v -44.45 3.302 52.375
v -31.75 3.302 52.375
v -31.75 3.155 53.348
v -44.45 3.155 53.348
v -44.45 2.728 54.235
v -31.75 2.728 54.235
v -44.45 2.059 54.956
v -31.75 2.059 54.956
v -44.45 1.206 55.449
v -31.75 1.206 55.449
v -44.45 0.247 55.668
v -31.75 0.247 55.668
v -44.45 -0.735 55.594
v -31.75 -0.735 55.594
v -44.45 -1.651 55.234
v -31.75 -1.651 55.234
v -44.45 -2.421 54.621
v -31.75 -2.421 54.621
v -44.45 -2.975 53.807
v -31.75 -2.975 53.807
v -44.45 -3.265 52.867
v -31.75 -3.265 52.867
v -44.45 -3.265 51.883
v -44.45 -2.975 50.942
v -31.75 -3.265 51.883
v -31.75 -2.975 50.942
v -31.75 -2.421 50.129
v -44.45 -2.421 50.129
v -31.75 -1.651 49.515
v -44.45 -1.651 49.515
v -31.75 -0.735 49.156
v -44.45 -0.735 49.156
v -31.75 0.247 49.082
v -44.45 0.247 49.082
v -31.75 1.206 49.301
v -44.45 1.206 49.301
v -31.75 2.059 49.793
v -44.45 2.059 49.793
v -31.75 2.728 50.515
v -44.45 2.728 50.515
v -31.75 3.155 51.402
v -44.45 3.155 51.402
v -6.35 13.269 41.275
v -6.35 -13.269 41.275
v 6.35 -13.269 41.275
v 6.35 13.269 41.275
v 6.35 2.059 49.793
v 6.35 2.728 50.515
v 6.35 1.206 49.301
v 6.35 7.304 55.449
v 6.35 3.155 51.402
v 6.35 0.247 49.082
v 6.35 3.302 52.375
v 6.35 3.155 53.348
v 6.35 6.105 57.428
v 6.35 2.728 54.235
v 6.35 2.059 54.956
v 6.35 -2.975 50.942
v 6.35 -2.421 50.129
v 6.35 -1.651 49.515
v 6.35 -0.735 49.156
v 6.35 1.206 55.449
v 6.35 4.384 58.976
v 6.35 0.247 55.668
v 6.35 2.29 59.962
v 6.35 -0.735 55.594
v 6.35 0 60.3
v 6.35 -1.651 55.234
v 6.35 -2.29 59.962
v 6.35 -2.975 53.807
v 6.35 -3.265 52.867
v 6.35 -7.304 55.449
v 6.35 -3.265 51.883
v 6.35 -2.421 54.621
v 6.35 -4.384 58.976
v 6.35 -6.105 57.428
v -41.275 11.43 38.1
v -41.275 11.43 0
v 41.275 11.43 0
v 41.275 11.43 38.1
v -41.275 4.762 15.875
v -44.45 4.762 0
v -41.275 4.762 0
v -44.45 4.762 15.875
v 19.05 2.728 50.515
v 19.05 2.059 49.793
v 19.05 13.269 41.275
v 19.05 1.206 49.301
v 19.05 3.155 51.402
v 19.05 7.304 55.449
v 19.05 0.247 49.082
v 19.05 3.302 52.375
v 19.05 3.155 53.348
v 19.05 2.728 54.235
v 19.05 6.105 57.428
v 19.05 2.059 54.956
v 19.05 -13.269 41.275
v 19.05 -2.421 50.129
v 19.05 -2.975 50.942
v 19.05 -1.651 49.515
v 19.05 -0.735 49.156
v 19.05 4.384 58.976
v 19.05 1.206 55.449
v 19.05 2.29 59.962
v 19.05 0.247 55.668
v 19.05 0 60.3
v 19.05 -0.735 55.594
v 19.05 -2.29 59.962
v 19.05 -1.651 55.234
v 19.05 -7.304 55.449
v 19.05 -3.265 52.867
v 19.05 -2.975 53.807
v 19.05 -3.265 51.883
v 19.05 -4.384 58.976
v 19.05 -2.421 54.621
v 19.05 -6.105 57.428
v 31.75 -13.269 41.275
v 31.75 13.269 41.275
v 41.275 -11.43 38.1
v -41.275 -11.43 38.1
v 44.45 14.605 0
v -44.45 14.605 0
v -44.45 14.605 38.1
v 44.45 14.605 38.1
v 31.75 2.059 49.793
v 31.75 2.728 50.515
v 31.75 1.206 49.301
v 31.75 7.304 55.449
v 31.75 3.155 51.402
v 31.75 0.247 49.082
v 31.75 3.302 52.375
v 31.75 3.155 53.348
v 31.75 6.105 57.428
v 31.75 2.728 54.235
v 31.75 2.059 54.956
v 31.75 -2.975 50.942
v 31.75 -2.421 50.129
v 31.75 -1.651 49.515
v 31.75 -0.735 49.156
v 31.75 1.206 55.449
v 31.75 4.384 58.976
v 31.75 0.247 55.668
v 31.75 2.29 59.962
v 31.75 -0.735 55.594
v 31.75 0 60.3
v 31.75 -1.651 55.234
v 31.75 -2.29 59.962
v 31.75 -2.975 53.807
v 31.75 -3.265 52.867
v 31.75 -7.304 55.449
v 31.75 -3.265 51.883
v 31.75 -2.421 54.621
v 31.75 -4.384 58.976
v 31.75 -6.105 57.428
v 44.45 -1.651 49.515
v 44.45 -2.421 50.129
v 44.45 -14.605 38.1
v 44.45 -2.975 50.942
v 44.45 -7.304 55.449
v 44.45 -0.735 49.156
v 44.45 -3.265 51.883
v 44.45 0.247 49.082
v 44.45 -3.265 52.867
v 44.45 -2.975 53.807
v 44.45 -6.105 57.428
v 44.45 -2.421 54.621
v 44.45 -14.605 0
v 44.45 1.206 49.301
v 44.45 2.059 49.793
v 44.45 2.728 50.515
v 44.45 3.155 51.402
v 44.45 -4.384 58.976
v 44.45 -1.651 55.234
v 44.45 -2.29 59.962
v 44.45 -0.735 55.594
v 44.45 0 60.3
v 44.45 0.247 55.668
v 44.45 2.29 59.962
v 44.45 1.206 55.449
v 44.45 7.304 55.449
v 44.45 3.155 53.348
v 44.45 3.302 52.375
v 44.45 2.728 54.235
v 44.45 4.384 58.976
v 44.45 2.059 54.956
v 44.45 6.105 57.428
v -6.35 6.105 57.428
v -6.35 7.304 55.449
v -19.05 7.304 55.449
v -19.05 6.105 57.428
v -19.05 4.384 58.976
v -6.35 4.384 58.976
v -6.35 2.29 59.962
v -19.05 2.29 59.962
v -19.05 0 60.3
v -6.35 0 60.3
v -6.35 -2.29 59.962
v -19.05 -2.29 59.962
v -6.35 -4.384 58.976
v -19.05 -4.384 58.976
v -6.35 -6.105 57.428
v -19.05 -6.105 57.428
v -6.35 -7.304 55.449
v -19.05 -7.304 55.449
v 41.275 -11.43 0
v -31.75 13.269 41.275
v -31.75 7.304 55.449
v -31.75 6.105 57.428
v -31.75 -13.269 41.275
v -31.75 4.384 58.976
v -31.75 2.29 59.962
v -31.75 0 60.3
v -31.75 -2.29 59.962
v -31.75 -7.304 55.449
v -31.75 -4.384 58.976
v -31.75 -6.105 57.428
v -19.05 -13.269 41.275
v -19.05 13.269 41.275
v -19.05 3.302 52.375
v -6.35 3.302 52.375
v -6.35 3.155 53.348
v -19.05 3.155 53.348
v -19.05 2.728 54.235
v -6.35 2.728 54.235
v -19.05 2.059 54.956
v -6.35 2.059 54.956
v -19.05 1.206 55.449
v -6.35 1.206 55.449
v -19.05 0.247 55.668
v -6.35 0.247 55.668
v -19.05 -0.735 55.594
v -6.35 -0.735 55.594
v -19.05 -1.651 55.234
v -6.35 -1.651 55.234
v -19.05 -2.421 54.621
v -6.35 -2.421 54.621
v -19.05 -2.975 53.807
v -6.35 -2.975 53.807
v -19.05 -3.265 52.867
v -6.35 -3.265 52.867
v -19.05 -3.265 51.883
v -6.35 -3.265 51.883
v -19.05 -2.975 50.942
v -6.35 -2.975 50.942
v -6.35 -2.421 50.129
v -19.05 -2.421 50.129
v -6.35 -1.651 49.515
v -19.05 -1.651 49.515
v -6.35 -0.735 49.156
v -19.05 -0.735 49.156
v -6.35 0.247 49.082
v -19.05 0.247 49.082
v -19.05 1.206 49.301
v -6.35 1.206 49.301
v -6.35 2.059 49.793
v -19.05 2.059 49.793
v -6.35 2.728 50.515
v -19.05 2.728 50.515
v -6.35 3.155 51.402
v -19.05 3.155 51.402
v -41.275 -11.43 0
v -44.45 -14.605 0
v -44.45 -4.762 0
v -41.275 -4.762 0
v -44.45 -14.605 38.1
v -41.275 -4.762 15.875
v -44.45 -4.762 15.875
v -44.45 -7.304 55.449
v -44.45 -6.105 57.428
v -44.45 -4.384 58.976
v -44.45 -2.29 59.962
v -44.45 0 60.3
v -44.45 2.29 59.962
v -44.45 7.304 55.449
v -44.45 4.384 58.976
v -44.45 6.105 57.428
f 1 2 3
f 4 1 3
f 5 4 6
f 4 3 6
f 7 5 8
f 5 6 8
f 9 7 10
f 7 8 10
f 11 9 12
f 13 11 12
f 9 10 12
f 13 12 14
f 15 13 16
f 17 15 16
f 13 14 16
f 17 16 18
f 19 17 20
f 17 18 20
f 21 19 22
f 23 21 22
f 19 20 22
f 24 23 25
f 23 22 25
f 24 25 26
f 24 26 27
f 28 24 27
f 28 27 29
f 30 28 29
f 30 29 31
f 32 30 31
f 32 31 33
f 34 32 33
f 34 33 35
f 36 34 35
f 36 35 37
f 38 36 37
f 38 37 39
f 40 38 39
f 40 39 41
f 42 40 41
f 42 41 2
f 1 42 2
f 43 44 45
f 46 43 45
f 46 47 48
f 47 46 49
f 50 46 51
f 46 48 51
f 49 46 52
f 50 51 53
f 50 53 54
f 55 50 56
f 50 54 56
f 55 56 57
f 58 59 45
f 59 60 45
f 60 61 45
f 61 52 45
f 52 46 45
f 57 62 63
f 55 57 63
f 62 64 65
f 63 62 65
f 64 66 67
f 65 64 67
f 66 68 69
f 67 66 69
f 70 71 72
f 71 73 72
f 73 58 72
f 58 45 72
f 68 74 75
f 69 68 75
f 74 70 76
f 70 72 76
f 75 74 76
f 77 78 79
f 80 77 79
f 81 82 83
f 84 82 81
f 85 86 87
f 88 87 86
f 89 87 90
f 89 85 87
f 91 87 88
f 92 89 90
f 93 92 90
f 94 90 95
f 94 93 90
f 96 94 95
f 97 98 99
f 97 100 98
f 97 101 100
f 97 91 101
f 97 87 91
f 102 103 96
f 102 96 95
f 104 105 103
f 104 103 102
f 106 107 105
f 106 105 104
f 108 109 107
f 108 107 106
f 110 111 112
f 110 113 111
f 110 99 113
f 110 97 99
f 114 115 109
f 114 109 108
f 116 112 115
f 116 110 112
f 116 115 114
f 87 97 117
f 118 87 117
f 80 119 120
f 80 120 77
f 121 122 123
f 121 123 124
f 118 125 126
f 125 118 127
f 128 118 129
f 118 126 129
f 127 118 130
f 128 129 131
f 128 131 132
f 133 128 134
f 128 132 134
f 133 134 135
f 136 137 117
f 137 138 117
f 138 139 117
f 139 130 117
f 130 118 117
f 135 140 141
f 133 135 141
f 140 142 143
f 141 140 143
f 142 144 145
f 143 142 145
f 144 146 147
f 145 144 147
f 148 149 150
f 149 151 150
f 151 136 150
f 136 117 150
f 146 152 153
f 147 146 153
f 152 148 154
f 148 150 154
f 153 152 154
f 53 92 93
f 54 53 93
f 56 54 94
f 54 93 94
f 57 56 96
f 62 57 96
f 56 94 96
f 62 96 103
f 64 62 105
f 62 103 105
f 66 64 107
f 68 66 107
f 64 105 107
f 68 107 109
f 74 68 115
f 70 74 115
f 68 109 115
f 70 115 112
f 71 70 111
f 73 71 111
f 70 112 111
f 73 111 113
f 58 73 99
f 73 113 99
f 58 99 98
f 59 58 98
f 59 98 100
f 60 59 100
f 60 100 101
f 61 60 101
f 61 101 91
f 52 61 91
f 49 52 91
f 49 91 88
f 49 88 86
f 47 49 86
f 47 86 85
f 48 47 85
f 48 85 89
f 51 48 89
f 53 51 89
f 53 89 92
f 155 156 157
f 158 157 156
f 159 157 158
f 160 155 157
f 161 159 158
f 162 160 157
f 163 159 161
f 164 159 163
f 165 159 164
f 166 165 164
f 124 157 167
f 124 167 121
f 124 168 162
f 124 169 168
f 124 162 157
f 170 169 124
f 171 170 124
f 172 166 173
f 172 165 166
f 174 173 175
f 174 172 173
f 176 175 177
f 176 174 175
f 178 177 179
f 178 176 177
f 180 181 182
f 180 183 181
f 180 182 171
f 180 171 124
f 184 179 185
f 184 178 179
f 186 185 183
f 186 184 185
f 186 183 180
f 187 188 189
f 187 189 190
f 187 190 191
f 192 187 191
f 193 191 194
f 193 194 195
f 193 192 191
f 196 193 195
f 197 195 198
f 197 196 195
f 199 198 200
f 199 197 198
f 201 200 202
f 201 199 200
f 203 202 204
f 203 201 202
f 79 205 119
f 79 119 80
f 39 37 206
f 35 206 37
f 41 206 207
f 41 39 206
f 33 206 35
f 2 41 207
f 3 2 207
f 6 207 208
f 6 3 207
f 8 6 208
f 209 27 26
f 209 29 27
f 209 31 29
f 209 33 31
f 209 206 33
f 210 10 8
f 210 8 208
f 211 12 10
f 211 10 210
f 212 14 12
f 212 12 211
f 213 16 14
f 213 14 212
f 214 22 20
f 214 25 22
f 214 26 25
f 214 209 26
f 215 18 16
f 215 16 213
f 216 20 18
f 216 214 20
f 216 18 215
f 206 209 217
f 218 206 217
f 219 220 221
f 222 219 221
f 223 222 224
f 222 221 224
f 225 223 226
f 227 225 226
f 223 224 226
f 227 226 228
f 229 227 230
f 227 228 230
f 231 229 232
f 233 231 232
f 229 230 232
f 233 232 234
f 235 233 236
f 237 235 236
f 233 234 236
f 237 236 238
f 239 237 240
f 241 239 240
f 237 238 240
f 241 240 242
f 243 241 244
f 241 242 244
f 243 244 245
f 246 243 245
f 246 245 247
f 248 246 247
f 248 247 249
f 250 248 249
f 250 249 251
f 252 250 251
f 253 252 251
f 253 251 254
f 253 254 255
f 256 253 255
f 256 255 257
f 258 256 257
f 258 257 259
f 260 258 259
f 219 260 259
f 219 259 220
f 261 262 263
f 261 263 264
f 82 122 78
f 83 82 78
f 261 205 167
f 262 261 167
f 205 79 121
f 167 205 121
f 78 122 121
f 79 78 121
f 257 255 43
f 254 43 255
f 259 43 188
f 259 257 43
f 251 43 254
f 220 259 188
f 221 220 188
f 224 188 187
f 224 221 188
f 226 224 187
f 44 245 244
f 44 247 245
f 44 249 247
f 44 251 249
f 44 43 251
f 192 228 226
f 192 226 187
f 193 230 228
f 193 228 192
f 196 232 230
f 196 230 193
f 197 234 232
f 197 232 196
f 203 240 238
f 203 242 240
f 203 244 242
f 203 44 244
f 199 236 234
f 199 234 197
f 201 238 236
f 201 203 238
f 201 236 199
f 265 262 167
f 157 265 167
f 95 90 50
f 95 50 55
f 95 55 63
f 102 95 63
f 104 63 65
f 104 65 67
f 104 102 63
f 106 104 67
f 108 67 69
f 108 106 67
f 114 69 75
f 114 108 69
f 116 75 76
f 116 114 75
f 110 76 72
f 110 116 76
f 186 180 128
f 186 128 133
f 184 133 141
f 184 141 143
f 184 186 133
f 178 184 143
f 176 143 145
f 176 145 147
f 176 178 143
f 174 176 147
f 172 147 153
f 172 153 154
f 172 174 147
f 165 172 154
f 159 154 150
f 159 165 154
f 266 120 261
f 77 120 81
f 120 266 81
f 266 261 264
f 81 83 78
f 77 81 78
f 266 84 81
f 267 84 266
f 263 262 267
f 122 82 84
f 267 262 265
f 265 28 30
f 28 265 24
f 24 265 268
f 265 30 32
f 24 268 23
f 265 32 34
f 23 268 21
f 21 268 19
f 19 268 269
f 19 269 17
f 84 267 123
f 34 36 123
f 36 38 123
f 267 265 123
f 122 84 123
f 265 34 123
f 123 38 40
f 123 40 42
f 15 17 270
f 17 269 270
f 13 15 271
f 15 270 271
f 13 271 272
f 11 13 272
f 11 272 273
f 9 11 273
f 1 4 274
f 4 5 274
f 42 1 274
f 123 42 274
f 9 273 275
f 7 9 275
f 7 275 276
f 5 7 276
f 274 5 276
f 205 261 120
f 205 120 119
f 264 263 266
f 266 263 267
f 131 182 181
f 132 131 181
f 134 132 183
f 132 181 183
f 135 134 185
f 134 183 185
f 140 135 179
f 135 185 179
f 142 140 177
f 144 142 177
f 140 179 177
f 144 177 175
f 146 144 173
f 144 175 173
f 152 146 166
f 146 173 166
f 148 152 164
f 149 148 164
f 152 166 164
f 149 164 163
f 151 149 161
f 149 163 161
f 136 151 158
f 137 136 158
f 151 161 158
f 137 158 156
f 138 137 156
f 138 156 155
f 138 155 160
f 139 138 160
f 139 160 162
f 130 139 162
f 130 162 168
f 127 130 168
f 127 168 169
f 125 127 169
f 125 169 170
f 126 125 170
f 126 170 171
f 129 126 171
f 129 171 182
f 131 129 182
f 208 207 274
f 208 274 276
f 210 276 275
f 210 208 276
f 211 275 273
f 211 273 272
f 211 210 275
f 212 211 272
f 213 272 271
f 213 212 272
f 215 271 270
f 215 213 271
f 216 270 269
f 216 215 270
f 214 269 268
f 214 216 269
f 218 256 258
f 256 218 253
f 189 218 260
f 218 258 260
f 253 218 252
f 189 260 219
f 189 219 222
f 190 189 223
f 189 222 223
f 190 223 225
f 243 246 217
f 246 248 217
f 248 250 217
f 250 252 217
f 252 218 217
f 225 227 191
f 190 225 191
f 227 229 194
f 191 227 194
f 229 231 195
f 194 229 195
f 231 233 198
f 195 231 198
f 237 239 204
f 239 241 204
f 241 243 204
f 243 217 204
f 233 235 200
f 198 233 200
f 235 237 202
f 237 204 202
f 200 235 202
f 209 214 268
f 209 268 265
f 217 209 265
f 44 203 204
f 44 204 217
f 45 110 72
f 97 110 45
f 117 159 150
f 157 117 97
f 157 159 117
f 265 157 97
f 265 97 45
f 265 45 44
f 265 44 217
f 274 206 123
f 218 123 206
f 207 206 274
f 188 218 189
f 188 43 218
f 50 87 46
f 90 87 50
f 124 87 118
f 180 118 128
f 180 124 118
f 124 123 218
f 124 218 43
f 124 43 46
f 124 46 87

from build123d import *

# Parameters (mm, degrees)
F0_W     = 88.9
F0_H     = 29.21
F0_W_2   = 82.55
F0_H_2   = 22.86
F1_DEPTH = 38.1
F2_W     = 9.525
F2_H     = 15.875
F3_DEPTH = 25.4
F5_DEPTH = 88.9
F6_R     = 3.302
F7_DEPTH = 88.901
F8_W     = 12.7
F8_H     = 22.225
F9_DEPTH = 29.211


with BuildPart() as f1:
    # F0 (on Top) → F1 (new body)
    with BuildSketch(Plane.XY):
        Rectangle(F0_W, F0_H)
        Rectangle(F0_W_2, F0_H_2, mode=Mode.SUBTRACT)
    extrude(amount=F1_DEPTH)

    # F2 (on face) → F3 (cut)
    with BuildSketch(Plane(origin=(-44.45, 0, 0), x_dir=(0, -1, 0), z_dir=(-1, 0, 0))):
        with Locations((0, 7.9375)):
            Rectangle(F2_W, F2_H)
    extrude(amount=-F3_DEPTH, mode=Mode.SUBTRACT)

    # F4 (on face) → F5 (join, through all)
    with BuildSketch(Plane.YZ.offset(44.45)):
        with BuildLine():
            Line((14.605, 38.1), (7.304389, 55.448618))
            ThreePointArc((7.304389, 55.448618), (0, 60.2996), (-7.304389, 55.448618))
            Line((-7.304389, 55.448618), (-14.605, 38.1))
            Line((-14.605, 38.1), (14.605, 38.1))
        make_face()
    extrude(amount=-F5_DEPTH)

    # F6 (on face) → F7 (cut, through all)
    with BuildSketch(Plane.YZ.offset(44.45)):
        with Locations((0, 52.3748)):
            Circle(F6_R)
    extrude(amount=-F7_DEPTH, mode=Mode.SUBTRACT)

    # F8 (on face) → F9 (cut, through all)
    with BuildSketch(Plane.XZ.offset(14.605)):
        with Locations((-25.4, 52.3875)):
            Rectangle(F8_W, F8_H)
        with Locations((0, 52.3875)):
            Rectangle(F8_W, F8_H)
        with Locations((25.4, 52.3875)):
            Rectangle(F8_W, F8_H)
    extrude(amount=-F9_DEPTH, mode=Mode.SUBTRACT)


solid = f1.part
